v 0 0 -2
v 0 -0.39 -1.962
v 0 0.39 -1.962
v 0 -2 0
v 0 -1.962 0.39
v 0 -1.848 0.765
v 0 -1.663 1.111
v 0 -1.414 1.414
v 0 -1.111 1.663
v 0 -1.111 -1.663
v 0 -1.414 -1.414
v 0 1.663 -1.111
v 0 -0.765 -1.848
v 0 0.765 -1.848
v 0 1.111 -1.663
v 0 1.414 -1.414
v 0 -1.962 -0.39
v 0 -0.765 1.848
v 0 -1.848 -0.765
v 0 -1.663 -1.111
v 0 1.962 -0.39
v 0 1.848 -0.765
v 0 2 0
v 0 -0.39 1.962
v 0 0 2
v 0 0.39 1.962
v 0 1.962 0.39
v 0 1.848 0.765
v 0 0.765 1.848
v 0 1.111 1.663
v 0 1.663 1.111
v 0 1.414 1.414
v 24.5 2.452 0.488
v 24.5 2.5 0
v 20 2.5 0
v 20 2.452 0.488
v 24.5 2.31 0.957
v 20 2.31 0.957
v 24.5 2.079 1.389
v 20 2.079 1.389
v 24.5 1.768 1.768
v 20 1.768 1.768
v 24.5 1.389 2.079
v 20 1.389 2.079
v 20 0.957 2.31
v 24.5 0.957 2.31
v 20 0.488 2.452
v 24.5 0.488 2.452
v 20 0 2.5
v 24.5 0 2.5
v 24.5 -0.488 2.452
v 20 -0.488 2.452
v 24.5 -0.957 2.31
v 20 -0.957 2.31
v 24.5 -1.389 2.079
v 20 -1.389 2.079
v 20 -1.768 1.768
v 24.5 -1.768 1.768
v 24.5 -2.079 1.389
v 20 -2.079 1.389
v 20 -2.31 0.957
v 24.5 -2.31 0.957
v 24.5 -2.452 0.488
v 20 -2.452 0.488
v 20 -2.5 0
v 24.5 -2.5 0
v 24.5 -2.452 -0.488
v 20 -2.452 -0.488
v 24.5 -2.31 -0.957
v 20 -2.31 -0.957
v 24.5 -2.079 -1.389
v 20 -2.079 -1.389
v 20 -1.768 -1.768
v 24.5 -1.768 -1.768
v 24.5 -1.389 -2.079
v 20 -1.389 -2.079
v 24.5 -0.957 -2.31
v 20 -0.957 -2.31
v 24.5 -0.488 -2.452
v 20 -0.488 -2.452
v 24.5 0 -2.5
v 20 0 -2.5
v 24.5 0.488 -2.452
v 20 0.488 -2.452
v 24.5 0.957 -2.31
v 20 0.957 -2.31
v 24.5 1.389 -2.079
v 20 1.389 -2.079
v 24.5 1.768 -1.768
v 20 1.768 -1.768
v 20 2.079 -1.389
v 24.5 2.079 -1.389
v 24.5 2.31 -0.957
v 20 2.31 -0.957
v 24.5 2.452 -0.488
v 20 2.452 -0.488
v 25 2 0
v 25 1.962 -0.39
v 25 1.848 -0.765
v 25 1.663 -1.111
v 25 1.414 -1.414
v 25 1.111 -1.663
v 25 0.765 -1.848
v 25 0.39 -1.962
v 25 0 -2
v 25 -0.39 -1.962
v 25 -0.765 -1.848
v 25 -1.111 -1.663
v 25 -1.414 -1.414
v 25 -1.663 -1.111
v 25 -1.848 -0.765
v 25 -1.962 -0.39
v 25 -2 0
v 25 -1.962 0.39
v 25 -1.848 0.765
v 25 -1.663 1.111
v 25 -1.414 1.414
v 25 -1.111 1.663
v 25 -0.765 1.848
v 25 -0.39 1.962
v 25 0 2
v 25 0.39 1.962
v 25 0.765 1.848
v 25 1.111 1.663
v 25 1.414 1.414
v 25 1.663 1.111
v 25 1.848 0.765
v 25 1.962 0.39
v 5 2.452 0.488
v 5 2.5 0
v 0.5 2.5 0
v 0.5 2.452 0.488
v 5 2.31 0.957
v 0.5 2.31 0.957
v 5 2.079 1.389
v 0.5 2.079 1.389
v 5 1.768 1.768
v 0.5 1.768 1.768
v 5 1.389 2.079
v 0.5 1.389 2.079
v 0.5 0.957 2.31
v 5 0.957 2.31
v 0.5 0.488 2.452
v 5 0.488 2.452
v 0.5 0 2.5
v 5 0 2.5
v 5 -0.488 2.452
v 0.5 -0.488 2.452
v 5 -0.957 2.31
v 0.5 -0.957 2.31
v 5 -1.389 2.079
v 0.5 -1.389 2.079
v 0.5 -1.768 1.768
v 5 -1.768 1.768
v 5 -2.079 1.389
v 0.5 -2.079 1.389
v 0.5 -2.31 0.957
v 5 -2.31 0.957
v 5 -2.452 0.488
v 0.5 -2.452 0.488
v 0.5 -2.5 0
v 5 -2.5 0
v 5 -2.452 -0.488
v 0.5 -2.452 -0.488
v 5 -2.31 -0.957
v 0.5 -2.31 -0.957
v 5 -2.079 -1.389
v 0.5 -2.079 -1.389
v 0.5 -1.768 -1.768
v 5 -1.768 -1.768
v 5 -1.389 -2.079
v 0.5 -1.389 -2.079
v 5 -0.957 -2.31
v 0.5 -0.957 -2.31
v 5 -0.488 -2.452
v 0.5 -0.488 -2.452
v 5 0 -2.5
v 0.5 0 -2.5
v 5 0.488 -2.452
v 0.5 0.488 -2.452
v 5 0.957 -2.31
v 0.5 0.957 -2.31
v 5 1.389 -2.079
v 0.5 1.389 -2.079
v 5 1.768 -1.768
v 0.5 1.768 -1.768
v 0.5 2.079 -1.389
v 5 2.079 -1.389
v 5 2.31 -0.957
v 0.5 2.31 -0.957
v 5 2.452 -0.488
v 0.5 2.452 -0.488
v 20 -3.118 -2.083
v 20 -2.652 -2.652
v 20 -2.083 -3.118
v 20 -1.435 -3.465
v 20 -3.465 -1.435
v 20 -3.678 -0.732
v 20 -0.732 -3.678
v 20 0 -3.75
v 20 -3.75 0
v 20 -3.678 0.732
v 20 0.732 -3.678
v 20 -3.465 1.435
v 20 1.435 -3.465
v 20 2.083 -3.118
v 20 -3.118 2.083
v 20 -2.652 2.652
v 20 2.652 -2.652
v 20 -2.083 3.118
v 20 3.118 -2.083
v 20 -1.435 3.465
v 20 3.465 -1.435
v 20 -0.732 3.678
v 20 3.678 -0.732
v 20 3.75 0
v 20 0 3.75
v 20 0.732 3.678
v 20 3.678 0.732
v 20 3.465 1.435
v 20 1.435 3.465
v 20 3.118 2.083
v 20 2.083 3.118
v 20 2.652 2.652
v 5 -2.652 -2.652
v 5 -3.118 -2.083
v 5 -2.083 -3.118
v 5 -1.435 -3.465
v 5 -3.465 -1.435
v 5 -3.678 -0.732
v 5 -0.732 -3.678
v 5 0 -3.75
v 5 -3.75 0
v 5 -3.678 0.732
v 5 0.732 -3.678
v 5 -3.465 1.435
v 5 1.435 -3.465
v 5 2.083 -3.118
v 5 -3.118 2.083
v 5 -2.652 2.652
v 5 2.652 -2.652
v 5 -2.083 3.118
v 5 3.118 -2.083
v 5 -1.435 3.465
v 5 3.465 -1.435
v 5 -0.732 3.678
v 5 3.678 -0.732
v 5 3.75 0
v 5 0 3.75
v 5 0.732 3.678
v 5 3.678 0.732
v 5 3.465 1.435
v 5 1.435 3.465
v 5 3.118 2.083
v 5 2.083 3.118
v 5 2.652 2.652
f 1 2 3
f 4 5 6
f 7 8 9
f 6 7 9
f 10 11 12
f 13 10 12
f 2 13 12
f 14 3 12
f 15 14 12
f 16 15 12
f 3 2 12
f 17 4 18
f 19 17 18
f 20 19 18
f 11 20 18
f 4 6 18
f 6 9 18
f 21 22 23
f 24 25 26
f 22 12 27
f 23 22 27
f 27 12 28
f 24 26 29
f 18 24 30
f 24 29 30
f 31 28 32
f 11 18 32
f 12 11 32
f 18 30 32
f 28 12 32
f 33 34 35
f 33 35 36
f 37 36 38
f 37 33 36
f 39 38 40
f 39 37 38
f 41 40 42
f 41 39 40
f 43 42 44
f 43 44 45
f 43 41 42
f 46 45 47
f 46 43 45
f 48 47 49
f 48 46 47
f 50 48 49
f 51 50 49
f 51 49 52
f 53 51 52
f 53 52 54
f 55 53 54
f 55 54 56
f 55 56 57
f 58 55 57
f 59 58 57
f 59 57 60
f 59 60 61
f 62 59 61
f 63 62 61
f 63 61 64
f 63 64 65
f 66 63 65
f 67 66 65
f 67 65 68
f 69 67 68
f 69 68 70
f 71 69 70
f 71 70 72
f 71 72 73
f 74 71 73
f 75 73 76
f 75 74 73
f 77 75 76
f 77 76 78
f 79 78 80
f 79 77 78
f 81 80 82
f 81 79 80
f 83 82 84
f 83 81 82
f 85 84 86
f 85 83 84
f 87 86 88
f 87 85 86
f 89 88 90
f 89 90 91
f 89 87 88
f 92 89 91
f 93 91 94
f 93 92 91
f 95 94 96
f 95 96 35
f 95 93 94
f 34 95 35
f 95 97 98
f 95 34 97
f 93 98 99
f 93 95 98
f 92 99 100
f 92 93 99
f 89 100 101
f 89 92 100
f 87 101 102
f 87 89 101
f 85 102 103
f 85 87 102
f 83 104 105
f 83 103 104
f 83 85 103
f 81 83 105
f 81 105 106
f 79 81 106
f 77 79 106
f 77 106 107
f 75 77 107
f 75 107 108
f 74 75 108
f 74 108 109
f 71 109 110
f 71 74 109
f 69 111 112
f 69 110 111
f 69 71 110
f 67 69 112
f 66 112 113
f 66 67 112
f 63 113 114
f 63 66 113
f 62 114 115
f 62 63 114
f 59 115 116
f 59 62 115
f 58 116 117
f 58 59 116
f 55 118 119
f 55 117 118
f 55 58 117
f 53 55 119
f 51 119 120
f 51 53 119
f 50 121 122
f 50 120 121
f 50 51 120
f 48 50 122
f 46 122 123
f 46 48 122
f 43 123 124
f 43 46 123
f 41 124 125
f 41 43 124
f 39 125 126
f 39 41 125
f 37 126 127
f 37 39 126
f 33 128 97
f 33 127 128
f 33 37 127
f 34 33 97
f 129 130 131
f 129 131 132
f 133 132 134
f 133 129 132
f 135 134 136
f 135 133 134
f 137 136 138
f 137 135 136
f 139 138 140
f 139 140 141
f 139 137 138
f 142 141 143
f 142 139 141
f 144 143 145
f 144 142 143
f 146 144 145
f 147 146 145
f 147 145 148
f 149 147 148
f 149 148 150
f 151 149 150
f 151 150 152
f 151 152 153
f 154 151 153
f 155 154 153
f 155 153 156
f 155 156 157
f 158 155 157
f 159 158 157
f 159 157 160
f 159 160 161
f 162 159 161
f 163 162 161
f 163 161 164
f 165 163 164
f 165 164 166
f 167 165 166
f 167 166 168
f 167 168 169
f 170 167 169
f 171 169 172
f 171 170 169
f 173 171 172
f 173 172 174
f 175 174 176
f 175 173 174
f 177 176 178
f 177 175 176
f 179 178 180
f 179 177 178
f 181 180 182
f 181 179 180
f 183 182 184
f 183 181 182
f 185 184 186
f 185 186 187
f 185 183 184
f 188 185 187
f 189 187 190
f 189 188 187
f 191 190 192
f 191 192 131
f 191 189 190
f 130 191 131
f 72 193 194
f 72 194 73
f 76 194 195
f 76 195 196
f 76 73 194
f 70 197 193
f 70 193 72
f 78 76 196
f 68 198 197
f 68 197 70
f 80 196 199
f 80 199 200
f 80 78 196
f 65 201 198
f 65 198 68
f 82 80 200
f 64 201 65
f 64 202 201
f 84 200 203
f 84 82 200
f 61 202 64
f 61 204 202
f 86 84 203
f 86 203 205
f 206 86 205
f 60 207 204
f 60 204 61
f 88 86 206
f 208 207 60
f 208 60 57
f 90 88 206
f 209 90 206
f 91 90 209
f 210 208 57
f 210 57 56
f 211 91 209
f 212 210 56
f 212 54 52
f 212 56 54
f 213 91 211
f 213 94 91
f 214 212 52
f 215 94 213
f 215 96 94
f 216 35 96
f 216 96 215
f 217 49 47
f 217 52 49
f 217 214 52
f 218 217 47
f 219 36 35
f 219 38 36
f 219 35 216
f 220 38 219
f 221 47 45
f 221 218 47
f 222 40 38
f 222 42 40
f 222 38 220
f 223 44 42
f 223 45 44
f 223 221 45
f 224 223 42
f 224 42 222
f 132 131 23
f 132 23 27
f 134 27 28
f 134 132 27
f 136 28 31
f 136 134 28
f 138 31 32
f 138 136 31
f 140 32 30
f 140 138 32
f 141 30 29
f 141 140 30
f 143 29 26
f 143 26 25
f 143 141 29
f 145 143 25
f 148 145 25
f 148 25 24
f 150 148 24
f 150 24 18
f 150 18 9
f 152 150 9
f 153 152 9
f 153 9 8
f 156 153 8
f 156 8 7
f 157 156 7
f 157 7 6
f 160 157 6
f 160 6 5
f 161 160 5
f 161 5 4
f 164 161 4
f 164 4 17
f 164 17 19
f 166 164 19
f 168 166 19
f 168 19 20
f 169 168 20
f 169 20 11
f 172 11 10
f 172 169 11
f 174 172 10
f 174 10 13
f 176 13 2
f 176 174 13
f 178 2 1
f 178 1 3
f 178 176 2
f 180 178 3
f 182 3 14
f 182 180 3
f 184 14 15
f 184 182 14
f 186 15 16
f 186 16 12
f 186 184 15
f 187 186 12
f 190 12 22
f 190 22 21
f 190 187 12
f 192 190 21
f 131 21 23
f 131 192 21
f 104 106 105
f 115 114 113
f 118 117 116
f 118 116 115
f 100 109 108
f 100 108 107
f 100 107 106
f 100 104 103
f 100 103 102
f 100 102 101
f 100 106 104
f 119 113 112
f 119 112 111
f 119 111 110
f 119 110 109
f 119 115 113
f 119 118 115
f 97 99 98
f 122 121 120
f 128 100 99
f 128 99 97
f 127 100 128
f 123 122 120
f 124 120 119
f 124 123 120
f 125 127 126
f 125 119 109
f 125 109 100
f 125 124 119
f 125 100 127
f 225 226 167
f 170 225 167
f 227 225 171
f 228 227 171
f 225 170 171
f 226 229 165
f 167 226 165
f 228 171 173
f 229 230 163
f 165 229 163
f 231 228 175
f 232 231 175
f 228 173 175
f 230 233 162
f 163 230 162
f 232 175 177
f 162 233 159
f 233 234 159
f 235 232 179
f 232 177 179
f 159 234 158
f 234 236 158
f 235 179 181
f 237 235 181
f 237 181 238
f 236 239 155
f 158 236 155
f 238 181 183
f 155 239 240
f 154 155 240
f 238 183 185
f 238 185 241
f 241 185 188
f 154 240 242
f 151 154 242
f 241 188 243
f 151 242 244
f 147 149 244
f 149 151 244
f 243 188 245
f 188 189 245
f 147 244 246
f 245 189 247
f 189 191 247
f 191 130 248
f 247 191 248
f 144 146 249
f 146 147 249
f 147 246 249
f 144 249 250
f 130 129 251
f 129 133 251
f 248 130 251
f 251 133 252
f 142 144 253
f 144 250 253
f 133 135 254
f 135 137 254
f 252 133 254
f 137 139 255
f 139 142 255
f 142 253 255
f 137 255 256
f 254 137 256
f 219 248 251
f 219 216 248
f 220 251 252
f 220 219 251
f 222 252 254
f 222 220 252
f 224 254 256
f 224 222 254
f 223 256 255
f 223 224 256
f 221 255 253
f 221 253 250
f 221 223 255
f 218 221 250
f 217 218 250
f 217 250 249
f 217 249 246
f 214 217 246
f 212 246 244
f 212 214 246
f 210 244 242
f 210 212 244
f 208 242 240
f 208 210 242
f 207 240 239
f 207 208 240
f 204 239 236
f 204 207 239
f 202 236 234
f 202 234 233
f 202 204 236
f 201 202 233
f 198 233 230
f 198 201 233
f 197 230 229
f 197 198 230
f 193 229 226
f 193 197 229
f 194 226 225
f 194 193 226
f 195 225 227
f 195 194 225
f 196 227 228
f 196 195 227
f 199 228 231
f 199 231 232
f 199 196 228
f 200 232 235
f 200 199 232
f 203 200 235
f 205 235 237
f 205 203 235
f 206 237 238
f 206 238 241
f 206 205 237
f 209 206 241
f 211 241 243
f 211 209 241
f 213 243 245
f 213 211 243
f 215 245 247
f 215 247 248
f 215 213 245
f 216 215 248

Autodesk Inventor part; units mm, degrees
ref_plane "Startebene" through (0, 0, 0) normal (1, 0, 0) x (0, 1, 0)
ref_plane "XZ Plane" through (0, 0, 0) normal (0, 1, 0) x (-1, 0, 0)
ref_plane "XY Plane" through (0, 0, 0) normal (0, 0, 1) x (1, 0, 0)
sketch "Hauptskizze" plane through (0, 0, 0) normal (0, 0, 1) x (1, 0, 0)
  line L0 (0, 0) -> (25, 0)
  line L1 (0, 0) -> (0, 2.5)
  line L2 (0, 2.5) -> (5, 2.5)
  line L3 (5, 3.75) -> (20, 3.75)
  line L4 (25, 2.5) -> (25, 0)
  line L5 (20, 2.5) -> (25, 2.5)
  line L6 (5, 2.5) -> (5, 3.75)
  line L7 (20, 3.75) -> (20, 2.5)
  dimension "d3" = 5
  dimension "d5" = 7.5
  dimension "d14" = 5
revolve "Umdrehung1" add sketch "Hauptskizze" angle 360 about axis through (0, 0, 0) along (1, 0, 0)
chamfer "Fase3" distance 0.5 angle 45 1 edges at (25, -2.5, 0) measured on face at (21.6667, 2.4676, -0.401)
chamfer "Fase1" distance 0.5 angle 45 1 edges at (0, -2.5, 0) measured on face at (1.6667, 2.4676, -0.401)
properties part number "Welle 5x4+7.5x15+5x4" material "Messing, weicher Gelbton"
